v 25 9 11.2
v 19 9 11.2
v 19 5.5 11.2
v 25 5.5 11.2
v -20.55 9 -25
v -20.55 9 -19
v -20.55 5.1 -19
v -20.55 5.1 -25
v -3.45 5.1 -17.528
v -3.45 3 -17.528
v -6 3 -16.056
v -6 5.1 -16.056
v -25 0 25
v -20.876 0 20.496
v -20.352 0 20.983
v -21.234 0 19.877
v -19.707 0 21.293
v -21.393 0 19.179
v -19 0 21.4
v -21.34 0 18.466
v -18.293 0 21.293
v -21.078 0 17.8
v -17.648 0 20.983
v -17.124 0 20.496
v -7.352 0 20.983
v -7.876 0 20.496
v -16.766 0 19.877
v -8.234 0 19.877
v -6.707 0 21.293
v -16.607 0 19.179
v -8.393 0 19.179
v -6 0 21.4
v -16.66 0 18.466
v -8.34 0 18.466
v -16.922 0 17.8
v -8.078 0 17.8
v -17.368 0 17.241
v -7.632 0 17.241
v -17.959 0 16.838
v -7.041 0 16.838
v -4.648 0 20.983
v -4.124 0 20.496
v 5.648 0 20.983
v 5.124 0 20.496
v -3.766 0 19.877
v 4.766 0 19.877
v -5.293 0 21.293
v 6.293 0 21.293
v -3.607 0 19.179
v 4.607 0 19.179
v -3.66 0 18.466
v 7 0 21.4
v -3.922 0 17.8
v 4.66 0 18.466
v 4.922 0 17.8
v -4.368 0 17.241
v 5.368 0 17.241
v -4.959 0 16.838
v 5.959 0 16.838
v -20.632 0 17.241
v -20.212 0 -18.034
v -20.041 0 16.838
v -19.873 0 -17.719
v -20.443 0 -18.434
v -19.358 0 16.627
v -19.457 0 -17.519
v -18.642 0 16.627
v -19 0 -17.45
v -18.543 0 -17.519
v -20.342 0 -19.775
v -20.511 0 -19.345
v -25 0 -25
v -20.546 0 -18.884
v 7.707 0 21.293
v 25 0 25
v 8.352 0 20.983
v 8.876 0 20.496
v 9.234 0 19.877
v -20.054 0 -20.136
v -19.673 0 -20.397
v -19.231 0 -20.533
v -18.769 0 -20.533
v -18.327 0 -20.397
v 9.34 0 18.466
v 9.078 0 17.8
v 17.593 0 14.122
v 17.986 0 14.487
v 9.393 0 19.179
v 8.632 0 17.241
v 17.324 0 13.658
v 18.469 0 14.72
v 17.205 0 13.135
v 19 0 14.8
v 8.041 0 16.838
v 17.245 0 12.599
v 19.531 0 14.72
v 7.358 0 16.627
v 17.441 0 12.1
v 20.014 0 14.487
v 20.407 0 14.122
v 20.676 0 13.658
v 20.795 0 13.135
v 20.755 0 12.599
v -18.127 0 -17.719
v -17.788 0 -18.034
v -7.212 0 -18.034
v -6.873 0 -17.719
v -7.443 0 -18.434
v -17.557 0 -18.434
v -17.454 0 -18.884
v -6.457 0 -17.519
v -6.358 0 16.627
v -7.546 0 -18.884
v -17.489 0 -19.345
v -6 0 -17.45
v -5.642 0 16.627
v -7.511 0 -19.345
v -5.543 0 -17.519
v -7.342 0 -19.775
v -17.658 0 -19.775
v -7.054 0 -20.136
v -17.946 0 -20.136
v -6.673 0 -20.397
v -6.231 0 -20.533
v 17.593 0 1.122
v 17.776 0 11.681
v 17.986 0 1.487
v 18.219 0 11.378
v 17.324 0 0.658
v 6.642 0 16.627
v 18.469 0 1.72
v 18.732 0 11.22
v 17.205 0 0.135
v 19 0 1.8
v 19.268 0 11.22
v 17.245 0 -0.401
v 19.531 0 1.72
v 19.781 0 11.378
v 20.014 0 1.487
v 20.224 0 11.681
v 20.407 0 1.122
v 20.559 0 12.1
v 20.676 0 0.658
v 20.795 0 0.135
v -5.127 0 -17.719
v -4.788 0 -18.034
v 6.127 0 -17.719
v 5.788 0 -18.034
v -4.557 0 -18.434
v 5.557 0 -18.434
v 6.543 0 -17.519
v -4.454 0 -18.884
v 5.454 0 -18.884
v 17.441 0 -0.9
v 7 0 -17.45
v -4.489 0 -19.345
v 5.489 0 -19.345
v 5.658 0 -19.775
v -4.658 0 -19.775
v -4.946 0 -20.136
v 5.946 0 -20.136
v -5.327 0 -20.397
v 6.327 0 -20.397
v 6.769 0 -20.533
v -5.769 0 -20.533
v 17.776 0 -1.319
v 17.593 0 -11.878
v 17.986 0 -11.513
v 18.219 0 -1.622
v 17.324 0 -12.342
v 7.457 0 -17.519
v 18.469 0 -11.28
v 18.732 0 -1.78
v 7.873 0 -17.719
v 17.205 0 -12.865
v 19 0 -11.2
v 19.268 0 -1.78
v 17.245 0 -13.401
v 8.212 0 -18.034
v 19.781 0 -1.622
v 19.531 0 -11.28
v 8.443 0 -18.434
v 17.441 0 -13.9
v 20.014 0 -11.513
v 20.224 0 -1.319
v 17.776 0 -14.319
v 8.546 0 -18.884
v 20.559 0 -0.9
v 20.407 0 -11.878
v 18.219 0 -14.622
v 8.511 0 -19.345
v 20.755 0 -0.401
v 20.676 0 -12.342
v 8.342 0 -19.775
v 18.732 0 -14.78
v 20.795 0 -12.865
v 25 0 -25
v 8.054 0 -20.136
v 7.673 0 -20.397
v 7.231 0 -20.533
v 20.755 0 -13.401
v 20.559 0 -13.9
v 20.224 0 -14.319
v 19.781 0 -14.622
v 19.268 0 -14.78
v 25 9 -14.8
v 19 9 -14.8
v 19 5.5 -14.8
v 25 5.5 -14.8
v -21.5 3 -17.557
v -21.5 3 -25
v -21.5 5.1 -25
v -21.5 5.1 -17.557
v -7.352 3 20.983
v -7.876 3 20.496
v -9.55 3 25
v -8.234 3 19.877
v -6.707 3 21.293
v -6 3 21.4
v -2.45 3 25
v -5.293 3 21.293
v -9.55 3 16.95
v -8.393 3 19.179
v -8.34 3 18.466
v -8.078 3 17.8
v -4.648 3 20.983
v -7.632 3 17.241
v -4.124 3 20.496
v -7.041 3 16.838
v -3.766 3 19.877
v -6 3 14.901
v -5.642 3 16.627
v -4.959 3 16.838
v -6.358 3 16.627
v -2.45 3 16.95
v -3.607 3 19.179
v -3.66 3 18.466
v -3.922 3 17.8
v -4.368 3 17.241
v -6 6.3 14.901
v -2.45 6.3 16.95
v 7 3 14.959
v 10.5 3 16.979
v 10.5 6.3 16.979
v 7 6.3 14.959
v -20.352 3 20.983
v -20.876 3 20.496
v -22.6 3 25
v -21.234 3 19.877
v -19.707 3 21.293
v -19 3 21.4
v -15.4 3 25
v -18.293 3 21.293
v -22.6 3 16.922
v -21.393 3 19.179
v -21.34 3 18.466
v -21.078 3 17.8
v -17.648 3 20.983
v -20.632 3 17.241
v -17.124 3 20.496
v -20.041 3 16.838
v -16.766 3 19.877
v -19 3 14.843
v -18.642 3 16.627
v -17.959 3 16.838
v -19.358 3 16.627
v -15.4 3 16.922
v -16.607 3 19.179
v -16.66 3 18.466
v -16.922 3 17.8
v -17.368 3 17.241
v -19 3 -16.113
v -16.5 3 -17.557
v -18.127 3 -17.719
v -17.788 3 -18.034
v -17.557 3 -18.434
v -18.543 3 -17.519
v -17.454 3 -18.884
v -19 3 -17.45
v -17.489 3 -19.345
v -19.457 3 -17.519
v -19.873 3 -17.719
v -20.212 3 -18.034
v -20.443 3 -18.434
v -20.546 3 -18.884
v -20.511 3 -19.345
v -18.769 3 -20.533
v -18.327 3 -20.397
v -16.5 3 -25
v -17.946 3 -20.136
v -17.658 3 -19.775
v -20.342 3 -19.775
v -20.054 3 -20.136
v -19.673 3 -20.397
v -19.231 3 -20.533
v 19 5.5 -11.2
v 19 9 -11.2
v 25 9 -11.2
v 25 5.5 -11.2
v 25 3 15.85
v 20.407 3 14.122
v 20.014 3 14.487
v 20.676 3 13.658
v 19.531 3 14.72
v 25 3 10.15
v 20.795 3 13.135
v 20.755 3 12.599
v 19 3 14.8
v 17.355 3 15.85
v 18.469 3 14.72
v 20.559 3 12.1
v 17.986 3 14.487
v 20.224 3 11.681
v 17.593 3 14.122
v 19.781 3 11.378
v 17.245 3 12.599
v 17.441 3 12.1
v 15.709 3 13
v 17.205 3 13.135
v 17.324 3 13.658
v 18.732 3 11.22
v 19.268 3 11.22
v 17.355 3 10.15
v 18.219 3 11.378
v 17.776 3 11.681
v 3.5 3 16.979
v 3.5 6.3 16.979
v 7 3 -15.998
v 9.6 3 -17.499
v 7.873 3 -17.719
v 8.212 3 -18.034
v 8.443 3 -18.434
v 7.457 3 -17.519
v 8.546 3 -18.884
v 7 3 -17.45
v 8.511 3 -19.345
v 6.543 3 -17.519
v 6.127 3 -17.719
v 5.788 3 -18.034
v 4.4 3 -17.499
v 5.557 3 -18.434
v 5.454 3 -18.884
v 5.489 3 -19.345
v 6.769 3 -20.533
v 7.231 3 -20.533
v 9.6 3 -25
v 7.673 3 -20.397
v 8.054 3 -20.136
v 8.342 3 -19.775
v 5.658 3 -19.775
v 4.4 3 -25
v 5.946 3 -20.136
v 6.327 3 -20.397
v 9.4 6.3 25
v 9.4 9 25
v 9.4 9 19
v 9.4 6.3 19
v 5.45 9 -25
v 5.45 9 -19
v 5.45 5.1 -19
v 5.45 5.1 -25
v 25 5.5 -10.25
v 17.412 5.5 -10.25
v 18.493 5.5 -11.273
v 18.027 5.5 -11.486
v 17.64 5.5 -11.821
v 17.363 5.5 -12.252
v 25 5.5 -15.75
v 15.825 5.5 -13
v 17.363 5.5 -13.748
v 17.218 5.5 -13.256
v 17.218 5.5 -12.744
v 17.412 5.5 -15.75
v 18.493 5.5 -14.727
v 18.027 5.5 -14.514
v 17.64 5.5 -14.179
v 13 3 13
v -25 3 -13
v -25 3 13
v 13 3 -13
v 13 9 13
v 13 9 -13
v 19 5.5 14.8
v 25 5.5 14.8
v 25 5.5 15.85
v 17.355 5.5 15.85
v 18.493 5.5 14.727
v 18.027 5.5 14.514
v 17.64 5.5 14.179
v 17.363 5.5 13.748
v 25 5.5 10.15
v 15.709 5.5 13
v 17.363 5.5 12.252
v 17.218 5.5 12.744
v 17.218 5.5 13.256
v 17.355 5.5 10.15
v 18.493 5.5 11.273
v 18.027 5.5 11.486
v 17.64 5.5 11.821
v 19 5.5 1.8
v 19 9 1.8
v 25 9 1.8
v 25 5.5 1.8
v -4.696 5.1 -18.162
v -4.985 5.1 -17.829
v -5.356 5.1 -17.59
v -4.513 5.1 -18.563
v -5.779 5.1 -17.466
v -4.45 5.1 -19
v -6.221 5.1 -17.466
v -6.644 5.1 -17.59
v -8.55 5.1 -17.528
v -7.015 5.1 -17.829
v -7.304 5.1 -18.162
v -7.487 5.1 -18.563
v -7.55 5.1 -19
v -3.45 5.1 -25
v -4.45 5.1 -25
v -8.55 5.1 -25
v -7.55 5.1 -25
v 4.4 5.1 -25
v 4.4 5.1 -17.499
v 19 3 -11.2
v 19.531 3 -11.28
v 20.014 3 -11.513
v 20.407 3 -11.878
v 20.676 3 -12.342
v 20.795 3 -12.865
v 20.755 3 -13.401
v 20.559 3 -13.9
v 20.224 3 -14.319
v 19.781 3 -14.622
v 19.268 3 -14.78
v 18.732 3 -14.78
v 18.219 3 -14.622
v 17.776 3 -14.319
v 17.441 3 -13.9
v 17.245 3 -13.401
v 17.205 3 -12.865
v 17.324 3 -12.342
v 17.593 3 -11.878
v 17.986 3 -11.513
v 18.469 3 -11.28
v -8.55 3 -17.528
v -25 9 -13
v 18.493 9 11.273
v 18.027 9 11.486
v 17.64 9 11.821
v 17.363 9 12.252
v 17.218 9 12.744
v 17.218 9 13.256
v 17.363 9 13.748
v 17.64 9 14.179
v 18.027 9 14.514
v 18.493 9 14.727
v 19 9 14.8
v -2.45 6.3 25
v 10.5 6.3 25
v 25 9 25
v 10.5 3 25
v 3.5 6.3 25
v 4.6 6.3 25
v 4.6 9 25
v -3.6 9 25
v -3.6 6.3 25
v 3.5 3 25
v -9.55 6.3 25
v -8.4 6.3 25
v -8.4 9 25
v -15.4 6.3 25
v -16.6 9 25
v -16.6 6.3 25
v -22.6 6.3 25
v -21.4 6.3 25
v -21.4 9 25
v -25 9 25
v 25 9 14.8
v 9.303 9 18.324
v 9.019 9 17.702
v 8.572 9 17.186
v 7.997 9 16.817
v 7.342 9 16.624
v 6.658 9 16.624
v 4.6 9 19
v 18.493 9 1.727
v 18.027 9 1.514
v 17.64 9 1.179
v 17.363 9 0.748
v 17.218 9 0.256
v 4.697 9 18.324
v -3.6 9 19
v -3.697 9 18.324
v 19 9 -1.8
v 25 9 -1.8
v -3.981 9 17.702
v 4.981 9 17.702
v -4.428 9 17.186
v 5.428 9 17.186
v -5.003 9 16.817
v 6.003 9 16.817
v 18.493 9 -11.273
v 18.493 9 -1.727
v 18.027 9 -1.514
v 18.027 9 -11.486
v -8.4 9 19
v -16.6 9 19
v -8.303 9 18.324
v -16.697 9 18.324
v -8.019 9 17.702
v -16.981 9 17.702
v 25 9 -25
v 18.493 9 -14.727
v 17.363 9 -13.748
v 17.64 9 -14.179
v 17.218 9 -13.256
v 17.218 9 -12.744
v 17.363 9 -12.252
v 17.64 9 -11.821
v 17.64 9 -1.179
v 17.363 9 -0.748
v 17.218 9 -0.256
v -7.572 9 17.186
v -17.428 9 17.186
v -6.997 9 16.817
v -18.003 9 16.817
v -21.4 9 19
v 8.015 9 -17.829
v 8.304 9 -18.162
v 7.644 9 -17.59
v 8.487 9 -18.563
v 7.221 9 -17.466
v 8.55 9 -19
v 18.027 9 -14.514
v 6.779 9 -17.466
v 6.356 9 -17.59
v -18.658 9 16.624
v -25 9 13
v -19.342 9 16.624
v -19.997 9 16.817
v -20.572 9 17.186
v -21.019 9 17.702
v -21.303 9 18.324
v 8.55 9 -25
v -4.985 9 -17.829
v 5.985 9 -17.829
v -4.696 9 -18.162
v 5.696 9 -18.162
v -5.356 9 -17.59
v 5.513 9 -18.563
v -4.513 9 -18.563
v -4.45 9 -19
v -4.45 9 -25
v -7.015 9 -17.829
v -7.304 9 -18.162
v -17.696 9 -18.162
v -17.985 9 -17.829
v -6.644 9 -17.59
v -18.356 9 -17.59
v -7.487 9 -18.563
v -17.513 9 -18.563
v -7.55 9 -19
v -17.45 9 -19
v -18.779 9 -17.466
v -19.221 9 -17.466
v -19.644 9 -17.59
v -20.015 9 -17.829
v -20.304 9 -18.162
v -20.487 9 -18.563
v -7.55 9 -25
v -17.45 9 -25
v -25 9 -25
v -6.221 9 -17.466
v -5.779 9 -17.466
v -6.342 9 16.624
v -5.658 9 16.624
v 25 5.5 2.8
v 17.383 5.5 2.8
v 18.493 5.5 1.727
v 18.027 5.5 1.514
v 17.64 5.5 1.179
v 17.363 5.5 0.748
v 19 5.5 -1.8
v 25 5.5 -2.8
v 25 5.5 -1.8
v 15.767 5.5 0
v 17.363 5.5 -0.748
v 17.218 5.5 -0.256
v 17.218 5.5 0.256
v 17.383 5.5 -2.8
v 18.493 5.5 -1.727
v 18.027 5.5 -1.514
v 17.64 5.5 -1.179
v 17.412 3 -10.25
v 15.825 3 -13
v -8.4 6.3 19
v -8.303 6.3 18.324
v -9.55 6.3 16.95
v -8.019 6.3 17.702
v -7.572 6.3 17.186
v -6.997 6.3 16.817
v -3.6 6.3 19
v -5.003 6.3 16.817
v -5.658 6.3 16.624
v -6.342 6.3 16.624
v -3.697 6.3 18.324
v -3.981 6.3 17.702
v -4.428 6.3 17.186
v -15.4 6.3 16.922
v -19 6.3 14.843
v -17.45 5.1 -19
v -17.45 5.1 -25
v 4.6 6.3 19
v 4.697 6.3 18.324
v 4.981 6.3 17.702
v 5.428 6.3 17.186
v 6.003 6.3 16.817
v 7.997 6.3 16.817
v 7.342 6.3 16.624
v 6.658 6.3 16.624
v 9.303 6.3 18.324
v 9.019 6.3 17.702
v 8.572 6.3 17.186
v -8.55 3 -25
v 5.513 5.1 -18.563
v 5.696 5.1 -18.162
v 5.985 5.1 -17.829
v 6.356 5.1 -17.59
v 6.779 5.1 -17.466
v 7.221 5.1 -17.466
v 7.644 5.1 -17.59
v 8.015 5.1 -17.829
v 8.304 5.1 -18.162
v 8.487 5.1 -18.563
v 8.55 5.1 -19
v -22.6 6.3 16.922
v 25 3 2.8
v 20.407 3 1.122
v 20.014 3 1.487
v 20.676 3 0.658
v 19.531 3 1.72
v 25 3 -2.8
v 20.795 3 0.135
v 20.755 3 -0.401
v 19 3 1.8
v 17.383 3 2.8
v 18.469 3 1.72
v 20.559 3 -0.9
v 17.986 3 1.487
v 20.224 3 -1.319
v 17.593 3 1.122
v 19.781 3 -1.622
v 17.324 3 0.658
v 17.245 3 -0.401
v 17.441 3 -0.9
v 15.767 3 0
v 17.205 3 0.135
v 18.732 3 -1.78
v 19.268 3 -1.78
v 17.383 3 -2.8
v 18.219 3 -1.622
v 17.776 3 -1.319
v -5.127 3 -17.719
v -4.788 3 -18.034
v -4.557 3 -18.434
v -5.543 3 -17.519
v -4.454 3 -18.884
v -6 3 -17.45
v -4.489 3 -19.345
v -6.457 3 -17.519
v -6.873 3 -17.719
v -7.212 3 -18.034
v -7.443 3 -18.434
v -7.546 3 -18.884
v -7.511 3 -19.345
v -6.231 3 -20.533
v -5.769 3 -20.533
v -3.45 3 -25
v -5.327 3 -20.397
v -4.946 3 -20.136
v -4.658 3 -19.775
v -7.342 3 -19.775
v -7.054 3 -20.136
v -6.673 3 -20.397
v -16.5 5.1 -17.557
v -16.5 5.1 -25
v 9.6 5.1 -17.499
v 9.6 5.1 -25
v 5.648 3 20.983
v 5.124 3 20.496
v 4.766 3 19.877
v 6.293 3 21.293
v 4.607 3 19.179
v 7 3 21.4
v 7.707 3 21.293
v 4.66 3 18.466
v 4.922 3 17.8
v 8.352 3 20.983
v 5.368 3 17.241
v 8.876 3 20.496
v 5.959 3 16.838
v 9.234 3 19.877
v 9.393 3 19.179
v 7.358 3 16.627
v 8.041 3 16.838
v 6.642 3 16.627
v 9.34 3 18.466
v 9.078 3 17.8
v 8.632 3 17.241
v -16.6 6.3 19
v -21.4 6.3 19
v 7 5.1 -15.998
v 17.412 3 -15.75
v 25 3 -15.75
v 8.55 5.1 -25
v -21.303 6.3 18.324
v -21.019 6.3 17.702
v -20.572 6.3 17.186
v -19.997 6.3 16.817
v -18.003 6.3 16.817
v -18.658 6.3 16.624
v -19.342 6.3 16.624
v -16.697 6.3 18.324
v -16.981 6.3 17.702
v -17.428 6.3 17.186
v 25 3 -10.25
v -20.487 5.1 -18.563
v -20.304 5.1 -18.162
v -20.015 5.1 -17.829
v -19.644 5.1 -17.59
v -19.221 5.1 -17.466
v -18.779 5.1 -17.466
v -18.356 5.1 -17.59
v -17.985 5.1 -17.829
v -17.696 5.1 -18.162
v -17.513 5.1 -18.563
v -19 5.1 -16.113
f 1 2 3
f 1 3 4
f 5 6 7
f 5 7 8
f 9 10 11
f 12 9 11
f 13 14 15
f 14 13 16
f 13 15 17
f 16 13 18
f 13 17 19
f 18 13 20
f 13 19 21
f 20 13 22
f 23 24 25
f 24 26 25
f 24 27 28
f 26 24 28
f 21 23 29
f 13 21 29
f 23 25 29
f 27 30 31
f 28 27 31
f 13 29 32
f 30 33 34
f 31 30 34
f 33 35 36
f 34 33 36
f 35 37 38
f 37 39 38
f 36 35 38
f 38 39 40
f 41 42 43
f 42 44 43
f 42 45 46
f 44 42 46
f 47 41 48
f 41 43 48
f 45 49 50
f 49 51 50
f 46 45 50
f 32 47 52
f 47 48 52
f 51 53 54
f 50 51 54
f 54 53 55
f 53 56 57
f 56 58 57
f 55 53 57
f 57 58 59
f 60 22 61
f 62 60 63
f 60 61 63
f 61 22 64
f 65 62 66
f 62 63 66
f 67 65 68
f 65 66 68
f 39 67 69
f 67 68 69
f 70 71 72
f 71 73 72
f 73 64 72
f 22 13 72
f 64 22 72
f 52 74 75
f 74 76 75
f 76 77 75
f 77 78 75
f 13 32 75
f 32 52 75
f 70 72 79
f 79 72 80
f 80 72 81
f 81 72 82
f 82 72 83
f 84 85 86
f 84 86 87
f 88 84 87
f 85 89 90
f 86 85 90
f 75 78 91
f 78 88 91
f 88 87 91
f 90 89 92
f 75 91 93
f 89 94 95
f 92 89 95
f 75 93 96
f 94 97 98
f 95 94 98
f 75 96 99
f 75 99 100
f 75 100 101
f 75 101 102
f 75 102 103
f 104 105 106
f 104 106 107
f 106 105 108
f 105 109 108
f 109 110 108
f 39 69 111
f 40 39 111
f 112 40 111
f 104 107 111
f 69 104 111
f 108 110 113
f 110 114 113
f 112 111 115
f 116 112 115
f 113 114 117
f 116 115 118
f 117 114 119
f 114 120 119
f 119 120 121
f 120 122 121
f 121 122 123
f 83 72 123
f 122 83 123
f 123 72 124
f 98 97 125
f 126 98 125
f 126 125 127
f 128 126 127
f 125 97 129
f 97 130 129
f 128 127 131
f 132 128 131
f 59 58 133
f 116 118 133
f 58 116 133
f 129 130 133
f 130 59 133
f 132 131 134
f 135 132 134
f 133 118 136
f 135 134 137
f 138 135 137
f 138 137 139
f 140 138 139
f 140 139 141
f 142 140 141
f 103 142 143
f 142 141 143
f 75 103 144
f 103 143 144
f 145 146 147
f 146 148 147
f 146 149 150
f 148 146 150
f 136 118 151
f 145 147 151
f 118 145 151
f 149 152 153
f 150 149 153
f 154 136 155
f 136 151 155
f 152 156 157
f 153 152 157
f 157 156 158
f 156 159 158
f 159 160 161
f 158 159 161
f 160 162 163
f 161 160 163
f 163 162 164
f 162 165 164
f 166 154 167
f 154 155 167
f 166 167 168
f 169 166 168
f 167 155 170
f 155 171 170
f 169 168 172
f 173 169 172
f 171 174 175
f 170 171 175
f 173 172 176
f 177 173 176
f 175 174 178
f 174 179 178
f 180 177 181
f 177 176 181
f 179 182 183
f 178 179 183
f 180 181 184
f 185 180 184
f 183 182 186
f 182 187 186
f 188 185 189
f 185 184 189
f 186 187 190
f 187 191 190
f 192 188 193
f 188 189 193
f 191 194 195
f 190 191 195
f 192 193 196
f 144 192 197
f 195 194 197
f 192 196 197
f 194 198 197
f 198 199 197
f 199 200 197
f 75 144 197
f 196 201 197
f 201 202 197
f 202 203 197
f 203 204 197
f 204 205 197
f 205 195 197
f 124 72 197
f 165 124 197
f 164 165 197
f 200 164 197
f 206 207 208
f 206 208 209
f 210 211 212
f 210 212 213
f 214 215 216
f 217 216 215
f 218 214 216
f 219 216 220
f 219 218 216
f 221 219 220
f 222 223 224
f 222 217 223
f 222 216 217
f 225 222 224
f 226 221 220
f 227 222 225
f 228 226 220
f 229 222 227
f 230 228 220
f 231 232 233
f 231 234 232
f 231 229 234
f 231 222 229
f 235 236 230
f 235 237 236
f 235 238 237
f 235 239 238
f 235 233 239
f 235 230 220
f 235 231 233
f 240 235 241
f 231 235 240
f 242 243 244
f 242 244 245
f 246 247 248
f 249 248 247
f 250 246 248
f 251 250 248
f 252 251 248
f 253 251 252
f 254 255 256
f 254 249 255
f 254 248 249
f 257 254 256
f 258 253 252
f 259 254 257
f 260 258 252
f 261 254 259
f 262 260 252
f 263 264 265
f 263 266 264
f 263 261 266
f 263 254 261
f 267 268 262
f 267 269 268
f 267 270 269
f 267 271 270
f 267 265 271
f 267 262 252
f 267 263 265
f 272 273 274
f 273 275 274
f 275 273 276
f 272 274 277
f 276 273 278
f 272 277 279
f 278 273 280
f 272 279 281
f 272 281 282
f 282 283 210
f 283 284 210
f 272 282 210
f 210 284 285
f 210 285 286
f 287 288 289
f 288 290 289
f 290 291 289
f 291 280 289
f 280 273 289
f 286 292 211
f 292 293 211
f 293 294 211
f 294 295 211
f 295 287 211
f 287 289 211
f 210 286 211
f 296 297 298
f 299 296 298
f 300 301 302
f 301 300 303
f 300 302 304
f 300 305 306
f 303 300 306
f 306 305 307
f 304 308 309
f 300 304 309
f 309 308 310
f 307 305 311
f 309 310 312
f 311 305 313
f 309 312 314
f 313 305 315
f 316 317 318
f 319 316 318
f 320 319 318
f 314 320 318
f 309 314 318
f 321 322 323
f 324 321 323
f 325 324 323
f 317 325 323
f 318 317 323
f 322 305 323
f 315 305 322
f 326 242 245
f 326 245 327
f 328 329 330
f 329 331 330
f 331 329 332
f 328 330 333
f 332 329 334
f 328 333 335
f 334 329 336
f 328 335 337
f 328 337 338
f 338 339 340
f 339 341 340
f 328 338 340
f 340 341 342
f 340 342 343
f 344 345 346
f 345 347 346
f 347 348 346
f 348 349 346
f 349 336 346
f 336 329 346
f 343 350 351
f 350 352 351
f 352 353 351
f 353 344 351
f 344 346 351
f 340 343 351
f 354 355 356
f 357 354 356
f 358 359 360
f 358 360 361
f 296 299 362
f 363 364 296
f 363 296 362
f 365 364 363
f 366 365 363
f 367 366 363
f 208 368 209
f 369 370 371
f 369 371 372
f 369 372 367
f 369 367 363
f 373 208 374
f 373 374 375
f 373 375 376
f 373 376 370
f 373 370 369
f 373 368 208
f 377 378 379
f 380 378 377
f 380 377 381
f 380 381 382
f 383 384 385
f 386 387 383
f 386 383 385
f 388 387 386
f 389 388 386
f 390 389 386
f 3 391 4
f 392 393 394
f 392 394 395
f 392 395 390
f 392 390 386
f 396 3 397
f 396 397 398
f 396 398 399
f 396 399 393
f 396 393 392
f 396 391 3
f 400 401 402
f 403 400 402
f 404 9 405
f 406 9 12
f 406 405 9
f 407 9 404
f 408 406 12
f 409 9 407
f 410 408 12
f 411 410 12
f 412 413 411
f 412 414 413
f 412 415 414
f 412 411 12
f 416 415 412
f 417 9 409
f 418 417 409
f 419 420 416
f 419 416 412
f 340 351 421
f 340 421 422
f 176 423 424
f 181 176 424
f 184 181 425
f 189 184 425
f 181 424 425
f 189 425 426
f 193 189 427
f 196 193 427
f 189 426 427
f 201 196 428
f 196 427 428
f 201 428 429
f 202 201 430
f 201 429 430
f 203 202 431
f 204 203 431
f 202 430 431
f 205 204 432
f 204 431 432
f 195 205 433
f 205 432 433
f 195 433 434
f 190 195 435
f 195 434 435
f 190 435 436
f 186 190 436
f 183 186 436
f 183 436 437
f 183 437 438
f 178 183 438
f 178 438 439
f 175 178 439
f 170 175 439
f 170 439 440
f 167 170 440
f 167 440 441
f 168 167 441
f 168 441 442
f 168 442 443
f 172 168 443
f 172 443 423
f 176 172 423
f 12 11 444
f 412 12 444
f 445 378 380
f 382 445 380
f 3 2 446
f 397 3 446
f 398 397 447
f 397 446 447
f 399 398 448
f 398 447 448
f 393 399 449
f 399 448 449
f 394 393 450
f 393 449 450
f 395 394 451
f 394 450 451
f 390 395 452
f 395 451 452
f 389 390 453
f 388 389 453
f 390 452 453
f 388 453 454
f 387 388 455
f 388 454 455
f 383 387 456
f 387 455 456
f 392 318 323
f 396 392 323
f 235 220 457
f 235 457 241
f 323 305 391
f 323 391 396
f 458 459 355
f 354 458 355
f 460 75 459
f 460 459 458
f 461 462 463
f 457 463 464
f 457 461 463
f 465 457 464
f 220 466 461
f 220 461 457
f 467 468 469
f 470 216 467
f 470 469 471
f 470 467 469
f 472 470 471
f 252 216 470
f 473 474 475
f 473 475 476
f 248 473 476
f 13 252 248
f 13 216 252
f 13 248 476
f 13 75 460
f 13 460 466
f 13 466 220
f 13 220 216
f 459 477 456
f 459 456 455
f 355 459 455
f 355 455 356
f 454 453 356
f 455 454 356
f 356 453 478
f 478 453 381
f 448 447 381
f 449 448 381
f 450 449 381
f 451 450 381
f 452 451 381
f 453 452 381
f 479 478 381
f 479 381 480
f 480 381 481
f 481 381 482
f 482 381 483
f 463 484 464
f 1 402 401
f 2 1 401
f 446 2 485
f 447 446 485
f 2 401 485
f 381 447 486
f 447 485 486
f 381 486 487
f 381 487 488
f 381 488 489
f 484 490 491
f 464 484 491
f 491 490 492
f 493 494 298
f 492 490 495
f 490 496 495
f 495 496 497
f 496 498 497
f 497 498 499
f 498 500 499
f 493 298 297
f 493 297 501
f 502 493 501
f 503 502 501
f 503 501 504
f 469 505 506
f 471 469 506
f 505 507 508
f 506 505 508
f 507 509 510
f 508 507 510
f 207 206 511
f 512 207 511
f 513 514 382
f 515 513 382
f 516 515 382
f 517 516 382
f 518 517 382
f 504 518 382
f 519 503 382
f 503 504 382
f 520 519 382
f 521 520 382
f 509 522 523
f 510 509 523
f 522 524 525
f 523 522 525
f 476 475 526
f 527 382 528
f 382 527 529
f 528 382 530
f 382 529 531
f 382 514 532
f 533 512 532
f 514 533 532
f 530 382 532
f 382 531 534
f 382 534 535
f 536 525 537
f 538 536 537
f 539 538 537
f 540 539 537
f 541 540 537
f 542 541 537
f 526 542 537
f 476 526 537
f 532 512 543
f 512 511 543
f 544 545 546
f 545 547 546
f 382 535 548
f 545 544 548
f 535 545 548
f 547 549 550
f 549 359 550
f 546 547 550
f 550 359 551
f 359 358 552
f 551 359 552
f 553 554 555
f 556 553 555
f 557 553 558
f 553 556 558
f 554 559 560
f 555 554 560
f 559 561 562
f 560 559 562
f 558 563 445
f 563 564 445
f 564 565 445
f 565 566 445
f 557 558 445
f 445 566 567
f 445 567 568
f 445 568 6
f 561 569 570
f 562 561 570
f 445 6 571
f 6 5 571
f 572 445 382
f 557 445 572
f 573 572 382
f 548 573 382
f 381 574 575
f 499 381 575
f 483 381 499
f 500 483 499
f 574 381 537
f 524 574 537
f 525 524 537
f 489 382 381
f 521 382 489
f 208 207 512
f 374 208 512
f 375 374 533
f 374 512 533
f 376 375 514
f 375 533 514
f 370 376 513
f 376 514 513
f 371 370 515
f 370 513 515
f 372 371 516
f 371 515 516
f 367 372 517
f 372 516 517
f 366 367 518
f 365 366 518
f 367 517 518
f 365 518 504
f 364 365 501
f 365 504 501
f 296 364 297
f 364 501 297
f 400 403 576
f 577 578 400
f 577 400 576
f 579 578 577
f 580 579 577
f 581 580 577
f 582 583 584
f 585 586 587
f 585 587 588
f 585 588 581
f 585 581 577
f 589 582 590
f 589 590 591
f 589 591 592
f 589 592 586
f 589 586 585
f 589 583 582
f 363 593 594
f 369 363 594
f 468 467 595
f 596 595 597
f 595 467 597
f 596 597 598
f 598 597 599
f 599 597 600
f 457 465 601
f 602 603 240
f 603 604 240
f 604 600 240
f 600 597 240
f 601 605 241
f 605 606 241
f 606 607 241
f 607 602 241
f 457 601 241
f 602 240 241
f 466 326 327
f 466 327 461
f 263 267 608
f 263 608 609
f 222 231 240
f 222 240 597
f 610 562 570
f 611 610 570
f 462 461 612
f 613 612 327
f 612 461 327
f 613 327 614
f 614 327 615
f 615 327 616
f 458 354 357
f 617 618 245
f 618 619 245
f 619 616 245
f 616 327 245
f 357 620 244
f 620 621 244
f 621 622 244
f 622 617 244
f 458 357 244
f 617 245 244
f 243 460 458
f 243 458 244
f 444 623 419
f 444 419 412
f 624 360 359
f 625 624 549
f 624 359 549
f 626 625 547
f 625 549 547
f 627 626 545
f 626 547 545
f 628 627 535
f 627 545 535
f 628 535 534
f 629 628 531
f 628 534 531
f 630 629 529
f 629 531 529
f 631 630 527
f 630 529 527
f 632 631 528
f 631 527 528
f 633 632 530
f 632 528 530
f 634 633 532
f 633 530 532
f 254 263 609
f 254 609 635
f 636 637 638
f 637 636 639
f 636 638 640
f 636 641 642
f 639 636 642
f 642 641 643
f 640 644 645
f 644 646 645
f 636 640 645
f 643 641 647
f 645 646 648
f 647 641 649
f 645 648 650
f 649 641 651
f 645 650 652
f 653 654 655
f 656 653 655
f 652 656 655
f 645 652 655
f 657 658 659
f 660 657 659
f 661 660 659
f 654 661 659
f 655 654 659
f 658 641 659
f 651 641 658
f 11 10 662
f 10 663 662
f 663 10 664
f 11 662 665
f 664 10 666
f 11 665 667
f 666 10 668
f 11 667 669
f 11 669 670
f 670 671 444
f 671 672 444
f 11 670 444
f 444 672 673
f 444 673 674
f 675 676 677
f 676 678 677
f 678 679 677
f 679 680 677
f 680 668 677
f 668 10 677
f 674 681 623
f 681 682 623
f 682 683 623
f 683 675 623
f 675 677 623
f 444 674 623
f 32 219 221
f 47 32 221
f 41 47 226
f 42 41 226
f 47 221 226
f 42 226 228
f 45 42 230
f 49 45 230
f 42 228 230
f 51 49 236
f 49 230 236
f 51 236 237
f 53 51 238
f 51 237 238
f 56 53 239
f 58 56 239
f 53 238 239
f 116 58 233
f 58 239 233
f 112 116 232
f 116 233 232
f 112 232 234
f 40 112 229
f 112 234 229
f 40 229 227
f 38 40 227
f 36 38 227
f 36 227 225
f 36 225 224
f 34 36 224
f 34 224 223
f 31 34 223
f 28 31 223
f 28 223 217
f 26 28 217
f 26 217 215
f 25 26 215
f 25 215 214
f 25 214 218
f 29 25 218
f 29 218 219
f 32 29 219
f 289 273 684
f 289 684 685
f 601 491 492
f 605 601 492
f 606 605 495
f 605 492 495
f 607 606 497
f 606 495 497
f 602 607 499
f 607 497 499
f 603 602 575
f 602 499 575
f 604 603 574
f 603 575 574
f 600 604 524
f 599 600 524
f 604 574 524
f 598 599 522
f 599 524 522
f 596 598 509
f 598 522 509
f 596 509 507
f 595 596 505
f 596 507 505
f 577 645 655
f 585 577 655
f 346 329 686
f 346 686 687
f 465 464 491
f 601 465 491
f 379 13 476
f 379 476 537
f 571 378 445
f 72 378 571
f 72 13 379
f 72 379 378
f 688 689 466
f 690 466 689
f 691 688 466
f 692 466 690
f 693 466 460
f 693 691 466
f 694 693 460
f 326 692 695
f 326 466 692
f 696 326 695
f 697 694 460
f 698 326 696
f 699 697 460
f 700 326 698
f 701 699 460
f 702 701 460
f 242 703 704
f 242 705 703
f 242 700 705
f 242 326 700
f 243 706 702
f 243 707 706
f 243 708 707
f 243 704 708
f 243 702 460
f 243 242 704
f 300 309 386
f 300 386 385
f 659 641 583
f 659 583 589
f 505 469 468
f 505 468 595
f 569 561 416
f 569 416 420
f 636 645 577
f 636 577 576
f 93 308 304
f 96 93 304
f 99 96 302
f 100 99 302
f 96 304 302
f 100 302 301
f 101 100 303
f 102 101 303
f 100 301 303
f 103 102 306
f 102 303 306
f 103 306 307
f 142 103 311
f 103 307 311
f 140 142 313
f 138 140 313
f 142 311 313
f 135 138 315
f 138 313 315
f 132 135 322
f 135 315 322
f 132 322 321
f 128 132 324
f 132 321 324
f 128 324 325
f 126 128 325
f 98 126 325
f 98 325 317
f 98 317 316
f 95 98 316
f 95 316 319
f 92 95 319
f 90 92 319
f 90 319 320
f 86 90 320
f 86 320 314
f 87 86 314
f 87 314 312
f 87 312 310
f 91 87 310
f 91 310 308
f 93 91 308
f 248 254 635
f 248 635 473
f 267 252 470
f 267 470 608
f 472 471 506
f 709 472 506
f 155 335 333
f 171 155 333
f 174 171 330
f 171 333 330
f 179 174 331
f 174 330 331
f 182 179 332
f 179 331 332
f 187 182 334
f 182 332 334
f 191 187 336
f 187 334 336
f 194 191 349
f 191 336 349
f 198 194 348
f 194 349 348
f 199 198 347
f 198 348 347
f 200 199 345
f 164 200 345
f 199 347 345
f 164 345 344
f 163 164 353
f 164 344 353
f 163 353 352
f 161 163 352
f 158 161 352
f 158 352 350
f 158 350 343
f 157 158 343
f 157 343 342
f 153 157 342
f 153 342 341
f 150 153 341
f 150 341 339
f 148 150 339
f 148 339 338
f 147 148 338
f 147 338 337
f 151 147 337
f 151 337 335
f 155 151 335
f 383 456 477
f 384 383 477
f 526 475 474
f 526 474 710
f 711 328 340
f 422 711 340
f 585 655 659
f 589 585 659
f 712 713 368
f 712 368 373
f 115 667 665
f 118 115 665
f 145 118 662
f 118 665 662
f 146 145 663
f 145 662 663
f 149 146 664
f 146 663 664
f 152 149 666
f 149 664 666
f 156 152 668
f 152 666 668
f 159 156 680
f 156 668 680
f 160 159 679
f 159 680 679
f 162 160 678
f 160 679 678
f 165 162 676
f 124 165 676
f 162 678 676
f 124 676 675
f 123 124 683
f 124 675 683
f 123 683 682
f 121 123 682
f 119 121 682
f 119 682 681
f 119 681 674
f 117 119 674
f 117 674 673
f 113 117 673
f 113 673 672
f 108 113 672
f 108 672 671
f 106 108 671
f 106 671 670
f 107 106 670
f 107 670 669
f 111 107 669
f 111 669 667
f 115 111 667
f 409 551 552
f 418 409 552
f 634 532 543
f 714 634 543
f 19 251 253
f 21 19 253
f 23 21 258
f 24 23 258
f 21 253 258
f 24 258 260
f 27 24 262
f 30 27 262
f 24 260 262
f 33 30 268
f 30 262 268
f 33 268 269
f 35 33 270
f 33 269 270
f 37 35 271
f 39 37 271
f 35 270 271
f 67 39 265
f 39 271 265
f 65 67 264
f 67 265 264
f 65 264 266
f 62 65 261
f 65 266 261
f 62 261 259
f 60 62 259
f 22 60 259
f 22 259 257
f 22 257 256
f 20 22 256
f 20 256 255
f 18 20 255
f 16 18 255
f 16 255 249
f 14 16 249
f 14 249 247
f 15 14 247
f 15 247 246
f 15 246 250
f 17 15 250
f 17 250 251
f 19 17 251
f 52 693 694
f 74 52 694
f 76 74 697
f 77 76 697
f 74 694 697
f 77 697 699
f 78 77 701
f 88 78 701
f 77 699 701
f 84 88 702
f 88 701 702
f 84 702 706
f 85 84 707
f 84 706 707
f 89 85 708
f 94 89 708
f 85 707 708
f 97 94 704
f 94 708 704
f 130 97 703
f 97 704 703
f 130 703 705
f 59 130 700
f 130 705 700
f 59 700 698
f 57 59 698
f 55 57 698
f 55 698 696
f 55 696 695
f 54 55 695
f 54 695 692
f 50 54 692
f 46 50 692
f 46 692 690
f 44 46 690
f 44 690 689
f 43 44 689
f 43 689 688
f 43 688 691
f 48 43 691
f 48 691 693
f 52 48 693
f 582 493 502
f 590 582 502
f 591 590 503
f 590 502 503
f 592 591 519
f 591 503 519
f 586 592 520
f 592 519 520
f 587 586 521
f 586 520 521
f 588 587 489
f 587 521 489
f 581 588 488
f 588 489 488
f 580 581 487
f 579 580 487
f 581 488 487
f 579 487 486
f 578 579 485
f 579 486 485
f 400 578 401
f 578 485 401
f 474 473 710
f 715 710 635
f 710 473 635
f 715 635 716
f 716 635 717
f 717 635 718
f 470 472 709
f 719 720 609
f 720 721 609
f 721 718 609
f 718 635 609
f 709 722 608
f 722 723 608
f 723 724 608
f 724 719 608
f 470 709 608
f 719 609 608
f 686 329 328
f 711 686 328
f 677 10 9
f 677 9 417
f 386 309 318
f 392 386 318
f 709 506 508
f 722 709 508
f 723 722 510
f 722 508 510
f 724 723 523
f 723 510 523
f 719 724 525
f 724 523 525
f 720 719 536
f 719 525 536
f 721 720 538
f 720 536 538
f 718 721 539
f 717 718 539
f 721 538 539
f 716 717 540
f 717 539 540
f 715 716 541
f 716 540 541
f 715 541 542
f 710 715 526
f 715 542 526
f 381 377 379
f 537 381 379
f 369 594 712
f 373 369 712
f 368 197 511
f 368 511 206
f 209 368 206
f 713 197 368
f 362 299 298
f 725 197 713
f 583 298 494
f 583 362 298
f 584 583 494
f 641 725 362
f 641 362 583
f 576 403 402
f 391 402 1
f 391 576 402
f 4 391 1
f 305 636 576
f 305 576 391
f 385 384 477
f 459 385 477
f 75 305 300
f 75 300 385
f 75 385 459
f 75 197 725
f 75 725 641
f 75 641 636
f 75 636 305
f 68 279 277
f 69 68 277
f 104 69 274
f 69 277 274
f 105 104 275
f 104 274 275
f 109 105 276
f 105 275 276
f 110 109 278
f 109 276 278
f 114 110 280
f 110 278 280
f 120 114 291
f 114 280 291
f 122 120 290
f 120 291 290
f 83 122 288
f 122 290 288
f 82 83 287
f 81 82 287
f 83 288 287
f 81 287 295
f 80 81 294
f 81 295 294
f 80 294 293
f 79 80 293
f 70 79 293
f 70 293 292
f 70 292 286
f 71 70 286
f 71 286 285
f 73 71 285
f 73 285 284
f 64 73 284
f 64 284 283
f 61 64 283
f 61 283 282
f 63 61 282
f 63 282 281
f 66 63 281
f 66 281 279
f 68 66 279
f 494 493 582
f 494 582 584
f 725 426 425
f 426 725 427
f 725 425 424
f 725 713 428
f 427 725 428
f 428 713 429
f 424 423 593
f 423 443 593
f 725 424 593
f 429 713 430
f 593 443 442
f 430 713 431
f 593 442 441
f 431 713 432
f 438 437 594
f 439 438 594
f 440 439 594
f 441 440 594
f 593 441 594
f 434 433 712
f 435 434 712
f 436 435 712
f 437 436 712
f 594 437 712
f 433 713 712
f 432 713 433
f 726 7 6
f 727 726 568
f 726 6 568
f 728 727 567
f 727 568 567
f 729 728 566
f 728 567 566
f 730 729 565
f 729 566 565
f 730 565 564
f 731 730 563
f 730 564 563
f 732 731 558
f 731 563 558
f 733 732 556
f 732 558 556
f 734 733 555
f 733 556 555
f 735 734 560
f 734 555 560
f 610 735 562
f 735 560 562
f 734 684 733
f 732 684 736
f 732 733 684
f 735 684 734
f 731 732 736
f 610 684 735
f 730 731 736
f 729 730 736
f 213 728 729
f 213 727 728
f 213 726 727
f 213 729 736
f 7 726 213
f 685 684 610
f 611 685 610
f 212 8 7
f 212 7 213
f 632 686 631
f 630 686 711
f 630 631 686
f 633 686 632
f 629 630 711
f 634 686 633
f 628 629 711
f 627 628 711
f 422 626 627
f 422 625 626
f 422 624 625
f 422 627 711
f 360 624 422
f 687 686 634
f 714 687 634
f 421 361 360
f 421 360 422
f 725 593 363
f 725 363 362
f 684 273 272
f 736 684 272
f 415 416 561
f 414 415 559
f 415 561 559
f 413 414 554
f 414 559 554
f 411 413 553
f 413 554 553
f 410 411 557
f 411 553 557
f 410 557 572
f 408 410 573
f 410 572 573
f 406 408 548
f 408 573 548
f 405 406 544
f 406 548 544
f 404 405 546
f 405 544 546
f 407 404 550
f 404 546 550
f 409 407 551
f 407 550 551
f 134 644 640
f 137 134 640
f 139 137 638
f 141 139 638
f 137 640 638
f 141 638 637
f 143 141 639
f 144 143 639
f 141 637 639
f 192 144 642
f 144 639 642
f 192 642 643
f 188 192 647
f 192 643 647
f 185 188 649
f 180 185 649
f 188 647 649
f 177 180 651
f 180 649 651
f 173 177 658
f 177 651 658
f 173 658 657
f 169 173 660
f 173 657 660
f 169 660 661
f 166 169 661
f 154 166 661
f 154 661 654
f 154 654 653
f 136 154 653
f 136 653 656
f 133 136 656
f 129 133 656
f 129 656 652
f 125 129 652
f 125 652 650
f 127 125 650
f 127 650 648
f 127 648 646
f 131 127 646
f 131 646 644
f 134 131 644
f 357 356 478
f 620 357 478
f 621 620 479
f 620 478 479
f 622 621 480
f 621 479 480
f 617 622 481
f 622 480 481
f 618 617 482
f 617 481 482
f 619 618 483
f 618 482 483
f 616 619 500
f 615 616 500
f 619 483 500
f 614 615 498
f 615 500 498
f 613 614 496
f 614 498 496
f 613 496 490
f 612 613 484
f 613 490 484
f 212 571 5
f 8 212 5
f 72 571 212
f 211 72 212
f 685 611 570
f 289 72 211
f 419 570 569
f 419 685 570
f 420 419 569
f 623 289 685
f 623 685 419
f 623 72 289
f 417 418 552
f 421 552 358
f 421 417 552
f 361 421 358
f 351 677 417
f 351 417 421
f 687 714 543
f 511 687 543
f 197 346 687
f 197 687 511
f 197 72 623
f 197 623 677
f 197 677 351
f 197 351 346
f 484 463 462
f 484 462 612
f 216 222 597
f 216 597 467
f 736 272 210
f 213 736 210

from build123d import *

# Parameters (mm, degrees)
SKETCH1_W           = 50
SKETCH1_H           = 50
BOSS_EXTRUDE1_DEPTH = 3
BOSS_EXTRUDE2_DEPTH = 6
CUT_EXTRUDE1_DEPTH  = 2.1
CUT_EXTRUDE2_DEPTH  = 2.5
CUT_EXTRUDE3_DEPTH  = 3.3
SKETCH4_R           = 1.55
SKETCH4_R_2         = 1.8
SKETCH4_R_3         = 2.4
CUT_EXTRUDE4_DEPTH  = 37.482872694
CUT_EXTRUDE5_REACH  = 38.483
SKETCH5_W           = 3.1
SKETCH5_H           = 6
SKETCH5_W_2         = 6
SKETCH5_H_2         = 3.6
SKETCH5_W_3         = 4.8


with BuildPart() as part:
    # Sketch1 → Boss-Extrude1 (new body)
    with BuildSketch(Plane(origin=(0, 0, 0), x_dir=(1, 0, 0), z_dir=(0, 1, 0))):
        Rectangle(SKETCH1_W, SKETCH1_H)
    extrude(amount=BOSS_EXTRUDE1_DEPTH)

    # Sketch2 → Boss-Extrude2 (add)
    with BuildSketch(Plane(origin=(0, 3, 0), x_dir=(1, 0, 0), z_dir=(0, 1, 0))):
        Polygon((-13, 13), (-25, 13), (-25, 25), (25, 25), (25, -25), (-25, -25), (-25, -13), (-13, -13), (13, -13), (13, 13), align=None)
    extrude(amount=BOSS_EXTRUDE2_DEPTH)

    # Sketch3 → Cut-Extrude1 (cut)
    with BuildSketch(Plane(origin=(0, 3, 0), x_dir=(1, 0, 0), z_dir=(0, 1, 0))):
        Polygon((-21.5, 25), (-16.5, 25), (-16.5, 20.443375673), (-16.5, 17.556624327), (-19, 16.113248654), (-21.5, 17.556624327), (-21.5, 20.443375673), align=None)
        Polygon((-8.55, 25), (-3.45, 25), (-3.45, 20.472243186), (-3.45, 17.527756814), (-6, 16.055513627), (-8.55, 17.527756814), (-8.55, 20.472243186), align=None)
        Polygon((4.4, 25), (9.6, 25), (9.6, 20.5011107), (9.6, 17.4988893), (7, 15.9977786), (4.4, 17.4988893), (4.4, 20.5011107), align=None)
    extrude(amount=CUT_EXTRUDE1_DEPTH, mode=Mode.SUBTRACT)

    # Sketch3<3> → Cut-Extrude2 (cut)
    with BuildSketch(Plane(origin=(0, 3, 0), x_dir=(1, 0, 0), z_dir=(0, 1, 0))):
        Polygon((25, 15.75), (25, 10.25), (20.58771324, 10.25), (17.41228676, 10.25), (15.824573519, 13), (17.41228676, 15.75), (20.58771324, 15.75), align=None)
        Polygon((25, 2.8), (25, -2.8), (20.616580754, -2.8), (17.383419246, -2.8), (15.766838493, 0), (17.383419246, 2.8), (20.616580754, 2.8), align=None)
        Polygon((25, -10.15), (25, -15.85), (20.645448267, -15.85), (17.354551733, -15.85), (15.709103466, -13), (17.354551733, -10.15), (20.645448267, -10.15), align=None)
    extrude(amount=CUT_EXTRUDE2_DEPTH, mode=Mode.SUBTRACT)

    # Sketch3<4> → Cut-Extrude3 (cut)
    with BuildSketch(Plane(origin=(0, 3, 0), x_dir=(1, 0, 0), z_dir=(0, 1, 0))):
        Polygon((-22.6, -21.078460969), (-22.6, -25), (-15.4, -25), (-15.4, -21.078460969), (-15.4, -16.921539031), (-19, -14.843078062), (-22.6, -16.921539031), align=None)
        Polygon((-9.55, -21.049593456), (-9.55, -25), (-2.45, -25), (-2.45, -21.049593456), (-2.45, -16.950406544), (-6, -14.900813089), (-9.55, -16.950406544), align=None)
        Polygon((3.5, -21.020725942), (3.5, -25), (10.5, -25), (10.5, -21.020725942), (10.5, -16.979274058), (7, -14.958548116), (3.5, -16.979274058), align=None)
    extrude(amount=CUT_EXTRUDE3_DEPTH, mode=Mode.SUBTRACT)

    # Sketch4 → Cut-Extrude4 (cut, through all)
    with BuildSketch(Plane(origin=(0, 9, 0), x_dir=(1, 0, 0), z_dir=(0, 1, 0))):
        with Locations(Location((-19, 19, 0), (0, 0, 270))):
            Circle(SKETCH4_R)
        with Locations(Location((-6, 19, 0), (0, 0, 270))):
            Circle(SKETCH4_R)
        with Locations(Location((7, 19, 0), (0, 0, 270))):
            Circle(SKETCH4_R)
        with Locations(Location((19, 13, 0), (0, 0, 270))):
            Circle(SKETCH4_R_2)
        with Locations(Location((19, 0, 0), (0, 0, 270))):
            Circle(SKETCH4_R_2)
        with Locations(Location((19, -13, 0), (0, 0, 270))):
            Circle(SKETCH4_R_2)
        with Locations(Location((7, -19, 0), (0, 0, 270))):
            Circle(SKETCH4_R_3)
        with Locations(Location((-6, -19, 0), (0, 0, 270))):
            Circle(SKETCH4_R_3)
        with Locations(Location((-19, -19, 0), (0, 0, 270))):
            Circle(SKETCH4_R_3)
    extrude(amount=-CUT_EXTRUDE4_DEPTH, mode=Mode.SUBTRACT)

    # Cut-Extrude5: up to this face of the body (flat: up to its plane)
    cut_extrude5_end = Plane(part.part.faces().sort_by_distance((-19, 3, 24.875499774))[0])
    # Sketch5 → Cut-Extrude5 (cut, up to the picked face)
    with BuildSketch(Plane(origin=(0, 9, 0), x_dir=(1, 0, 0), z_dir=(0, 1, 0)), mode=Mode.PRIVATE) as cut_extrude5_sk1:
        with Locations((-19, 22)):
            Rectangle(SKETCH5_W, SKETCH5_H)
    cut_extrude5_tool1 = split(extrude(cut_extrude5_sk1.sketch, amount=-CUT_EXTRUDE5_REACH, mode=Mode.PRIVATE), bisect_by=cut_extrude5_end, keep=Keep.BOTH, mode=Mode.PRIVATE)
    # Sketch5 → Cut-Extrude5 (cut, up to the picked face)
    with BuildSketch(Plane(origin=(0, 9, 0), x_dir=(1, 0, 0), z_dir=(0, 1, 0)), mode=Mode.PRIVATE) as cut_extrude5_sk2:
        with Locations((-6, 22)):
            Rectangle(SKETCH5_W, SKETCH5_H)
    cut_extrude5_tool2 = split(extrude(cut_extrude5_sk2.sketch, amount=-CUT_EXTRUDE5_REACH, mode=Mode.PRIVATE), bisect_by=cut_extrude5_end, keep=Keep.BOTH, mode=Mode.PRIVATE)
    # Sketch5 → Cut-Extrude5 (cut, up to the picked face)
    with BuildSketch(Plane(origin=(0, 9, 0), x_dir=(1, 0, 0), z_dir=(0, 1, 0)), mode=Mode.PRIVATE) as cut_extrude5_sk3:
        with Locations((7, 22)):
            Rectangle(SKETCH5_W, SKETCH5_H)
    cut_extrude5_tool3 = split(extrude(cut_extrude5_sk3.sketch, amount=-CUT_EXTRUDE5_REACH, mode=Mode.PRIVATE), bisect_by=cut_extrude5_end, keep=Keep.BOTH, mode=Mode.PRIVATE)
    # Sketch5 → Cut-Extrude5 (cut, up to the picked face)
    with BuildSketch(Plane(origin=(0, 9, 0), x_dir=(1, 0, 0), z_dir=(0, 1, 0)), mode=Mode.PRIVATE) as cut_extrude5_sk4:
        with Locations((22, 13)):
            Rectangle(SKETCH5_W_2, SKETCH5_H_2)
    cut_extrude5_tool4 = split(extrude(cut_extrude5_sk4.sketch, amount=-CUT_EXTRUDE5_REACH, mode=Mode.PRIVATE), bisect_by=cut_extrude5_end, keep=Keep.BOTH, mode=Mode.PRIVATE)
    # Sketch5 → Cut-Extrude5 (cut, up to the picked face)
    with BuildSketch(Plane(origin=(0, 9, 0), x_dir=(1, 0, 0), z_dir=(0, 1, 0)), mode=Mode.PRIVATE) as cut_extrude5_sk5:
        with Locations((22, 0)):
            Rectangle(SKETCH5_W_2, SKETCH5_H_2)
    cut_extrude5_tool5 = split(extrude(cut_extrude5_sk5.sketch, amount=-CUT_EXTRUDE5_REACH, mode=Mode.PRIVATE), bisect_by=cut_extrude5_end, keep=Keep.BOTH, mode=Mode.PRIVATE)
    # Sketch5 → Cut-Extrude5 (cut, up to the picked face)
    with BuildSketch(Plane(origin=(0, 9, 0), x_dir=(1, 0, 0), z_dir=(0, 1, 0)), mode=Mode.PRIVATE) as cut_extrude5_sk6:
        with Locations((22, -13)):
            Rectangle(SKETCH5_W_2, SKETCH5_H_2)
    cut_extrude5_tool6 = split(extrude(cut_extrude5_sk6.sketch, amount=-CUT_EXTRUDE5_REACH, mode=Mode.PRIVATE), bisect_by=cut_extrude5_end, keep=Keep.BOTH, mode=Mode.PRIVATE)
    # Sketch5 → Cut-Extrude5 (cut, up to the picked face)
    with BuildSketch(Plane(origin=(0, 9, 0), x_dir=(1, 0, 0), z_dir=(0, 1, 0)), mode=Mode.PRIVATE) as cut_extrude5_sk7:
        with Locations((7, -22)):
            Rectangle(SKETCH5_W_3, SKETCH5_H)
    cut_extrude5_tool7 = split(extrude(cut_extrude5_sk7.sketch, amount=-CUT_EXTRUDE5_REACH, mode=Mode.PRIVATE), bisect_by=cut_extrude5_end, keep=Keep.BOTH, mode=Mode.PRIVATE)
    # Sketch5 → Cut-Extrude5 (cut, up to the picked face)
    with BuildSketch(Plane(origin=(0, 9, 0), x_dir=(1, 0, 0), z_dir=(0, 1, 0)), mode=Mode.PRIVATE) as cut_extrude5_sk8:
        with Locations((-6, -22)):
            Rectangle(SKETCH5_W_3, SKETCH5_H)
    cut_extrude5_tool8 = split(extrude(cut_extrude5_sk8.sketch, amount=-CUT_EXTRUDE5_REACH, mode=Mode.PRIVATE), bisect_by=cut_extrude5_end, keep=Keep.BOTH, mode=Mode.PRIVATE)
    # Sketch5 → Cut-Extrude5 (cut, up to the picked face)
    with BuildSketch(Plane(origin=(0, 9, 0), x_dir=(1, 0, 0), z_dir=(0, 1, 0)), mode=Mode.PRIVATE) as cut_extrude5_sk9:
        with Locations((-19, -22)):
            Rectangle(SKETCH5_W_3, SKETCH5_H)
    cut_extrude5_tool9 = split(extrude(cut_extrude5_sk9.sketch, amount=-CUT_EXTRUDE5_REACH, mode=Mode.PRIVATE), bisect_by=cut_extrude5_end, keep=Keep.BOTH, mode=Mode.PRIVATE)
    add(cut_extrude5_tool1.solids().sort_by(Axis((-19, 9, -22), (0, -1, 0)))[0], mode=Mode.SUBTRACT)
    add(cut_extrude5_tool2.solids().sort_by(Axis((-6, 9, -22), (0, -1, 0)))[0], mode=Mode.SUBTRACT)
    add(cut_extrude5_tool3.solids().sort_by(Axis((7, 9, -22), (0, -1, 0)))[0], mode=Mode.SUBTRACT)
    add(cut_extrude5_tool4.solids().sort_by(Axis((22, 9, -13), (0, -1, 0)))[0], mode=Mode.SUBTRACT)
    add(cut_extrude5_tool5.solids().sort_by(Axis((22, 9, 0), (0, -1, 0)))[0], mode=Mode.SUBTRACT)
    add(cut_extrude5_tool6.solids().sort_by(Axis((22, 9, 13), (0, -1, 0)))[0], mode=Mode.SUBTRACT)
    add(cut_extrude5_tool7.solids().sort_by(Axis((7, 9, 22), (0, -1, 0)))[0], mode=Mode.SUBTRACT)
    add(cut_extrude5_tool8.solids().sort_by(Axis((-6, 9, 22), (0, -1, 0)))[0], mode=Mode.SUBTRACT)
    add(cut_extrude5_tool9.solids().sort_by(Axis((-19, 9, 22), (0, -1, 0)))[0], mode=Mode.SUBTRACT)


solid = part.part
